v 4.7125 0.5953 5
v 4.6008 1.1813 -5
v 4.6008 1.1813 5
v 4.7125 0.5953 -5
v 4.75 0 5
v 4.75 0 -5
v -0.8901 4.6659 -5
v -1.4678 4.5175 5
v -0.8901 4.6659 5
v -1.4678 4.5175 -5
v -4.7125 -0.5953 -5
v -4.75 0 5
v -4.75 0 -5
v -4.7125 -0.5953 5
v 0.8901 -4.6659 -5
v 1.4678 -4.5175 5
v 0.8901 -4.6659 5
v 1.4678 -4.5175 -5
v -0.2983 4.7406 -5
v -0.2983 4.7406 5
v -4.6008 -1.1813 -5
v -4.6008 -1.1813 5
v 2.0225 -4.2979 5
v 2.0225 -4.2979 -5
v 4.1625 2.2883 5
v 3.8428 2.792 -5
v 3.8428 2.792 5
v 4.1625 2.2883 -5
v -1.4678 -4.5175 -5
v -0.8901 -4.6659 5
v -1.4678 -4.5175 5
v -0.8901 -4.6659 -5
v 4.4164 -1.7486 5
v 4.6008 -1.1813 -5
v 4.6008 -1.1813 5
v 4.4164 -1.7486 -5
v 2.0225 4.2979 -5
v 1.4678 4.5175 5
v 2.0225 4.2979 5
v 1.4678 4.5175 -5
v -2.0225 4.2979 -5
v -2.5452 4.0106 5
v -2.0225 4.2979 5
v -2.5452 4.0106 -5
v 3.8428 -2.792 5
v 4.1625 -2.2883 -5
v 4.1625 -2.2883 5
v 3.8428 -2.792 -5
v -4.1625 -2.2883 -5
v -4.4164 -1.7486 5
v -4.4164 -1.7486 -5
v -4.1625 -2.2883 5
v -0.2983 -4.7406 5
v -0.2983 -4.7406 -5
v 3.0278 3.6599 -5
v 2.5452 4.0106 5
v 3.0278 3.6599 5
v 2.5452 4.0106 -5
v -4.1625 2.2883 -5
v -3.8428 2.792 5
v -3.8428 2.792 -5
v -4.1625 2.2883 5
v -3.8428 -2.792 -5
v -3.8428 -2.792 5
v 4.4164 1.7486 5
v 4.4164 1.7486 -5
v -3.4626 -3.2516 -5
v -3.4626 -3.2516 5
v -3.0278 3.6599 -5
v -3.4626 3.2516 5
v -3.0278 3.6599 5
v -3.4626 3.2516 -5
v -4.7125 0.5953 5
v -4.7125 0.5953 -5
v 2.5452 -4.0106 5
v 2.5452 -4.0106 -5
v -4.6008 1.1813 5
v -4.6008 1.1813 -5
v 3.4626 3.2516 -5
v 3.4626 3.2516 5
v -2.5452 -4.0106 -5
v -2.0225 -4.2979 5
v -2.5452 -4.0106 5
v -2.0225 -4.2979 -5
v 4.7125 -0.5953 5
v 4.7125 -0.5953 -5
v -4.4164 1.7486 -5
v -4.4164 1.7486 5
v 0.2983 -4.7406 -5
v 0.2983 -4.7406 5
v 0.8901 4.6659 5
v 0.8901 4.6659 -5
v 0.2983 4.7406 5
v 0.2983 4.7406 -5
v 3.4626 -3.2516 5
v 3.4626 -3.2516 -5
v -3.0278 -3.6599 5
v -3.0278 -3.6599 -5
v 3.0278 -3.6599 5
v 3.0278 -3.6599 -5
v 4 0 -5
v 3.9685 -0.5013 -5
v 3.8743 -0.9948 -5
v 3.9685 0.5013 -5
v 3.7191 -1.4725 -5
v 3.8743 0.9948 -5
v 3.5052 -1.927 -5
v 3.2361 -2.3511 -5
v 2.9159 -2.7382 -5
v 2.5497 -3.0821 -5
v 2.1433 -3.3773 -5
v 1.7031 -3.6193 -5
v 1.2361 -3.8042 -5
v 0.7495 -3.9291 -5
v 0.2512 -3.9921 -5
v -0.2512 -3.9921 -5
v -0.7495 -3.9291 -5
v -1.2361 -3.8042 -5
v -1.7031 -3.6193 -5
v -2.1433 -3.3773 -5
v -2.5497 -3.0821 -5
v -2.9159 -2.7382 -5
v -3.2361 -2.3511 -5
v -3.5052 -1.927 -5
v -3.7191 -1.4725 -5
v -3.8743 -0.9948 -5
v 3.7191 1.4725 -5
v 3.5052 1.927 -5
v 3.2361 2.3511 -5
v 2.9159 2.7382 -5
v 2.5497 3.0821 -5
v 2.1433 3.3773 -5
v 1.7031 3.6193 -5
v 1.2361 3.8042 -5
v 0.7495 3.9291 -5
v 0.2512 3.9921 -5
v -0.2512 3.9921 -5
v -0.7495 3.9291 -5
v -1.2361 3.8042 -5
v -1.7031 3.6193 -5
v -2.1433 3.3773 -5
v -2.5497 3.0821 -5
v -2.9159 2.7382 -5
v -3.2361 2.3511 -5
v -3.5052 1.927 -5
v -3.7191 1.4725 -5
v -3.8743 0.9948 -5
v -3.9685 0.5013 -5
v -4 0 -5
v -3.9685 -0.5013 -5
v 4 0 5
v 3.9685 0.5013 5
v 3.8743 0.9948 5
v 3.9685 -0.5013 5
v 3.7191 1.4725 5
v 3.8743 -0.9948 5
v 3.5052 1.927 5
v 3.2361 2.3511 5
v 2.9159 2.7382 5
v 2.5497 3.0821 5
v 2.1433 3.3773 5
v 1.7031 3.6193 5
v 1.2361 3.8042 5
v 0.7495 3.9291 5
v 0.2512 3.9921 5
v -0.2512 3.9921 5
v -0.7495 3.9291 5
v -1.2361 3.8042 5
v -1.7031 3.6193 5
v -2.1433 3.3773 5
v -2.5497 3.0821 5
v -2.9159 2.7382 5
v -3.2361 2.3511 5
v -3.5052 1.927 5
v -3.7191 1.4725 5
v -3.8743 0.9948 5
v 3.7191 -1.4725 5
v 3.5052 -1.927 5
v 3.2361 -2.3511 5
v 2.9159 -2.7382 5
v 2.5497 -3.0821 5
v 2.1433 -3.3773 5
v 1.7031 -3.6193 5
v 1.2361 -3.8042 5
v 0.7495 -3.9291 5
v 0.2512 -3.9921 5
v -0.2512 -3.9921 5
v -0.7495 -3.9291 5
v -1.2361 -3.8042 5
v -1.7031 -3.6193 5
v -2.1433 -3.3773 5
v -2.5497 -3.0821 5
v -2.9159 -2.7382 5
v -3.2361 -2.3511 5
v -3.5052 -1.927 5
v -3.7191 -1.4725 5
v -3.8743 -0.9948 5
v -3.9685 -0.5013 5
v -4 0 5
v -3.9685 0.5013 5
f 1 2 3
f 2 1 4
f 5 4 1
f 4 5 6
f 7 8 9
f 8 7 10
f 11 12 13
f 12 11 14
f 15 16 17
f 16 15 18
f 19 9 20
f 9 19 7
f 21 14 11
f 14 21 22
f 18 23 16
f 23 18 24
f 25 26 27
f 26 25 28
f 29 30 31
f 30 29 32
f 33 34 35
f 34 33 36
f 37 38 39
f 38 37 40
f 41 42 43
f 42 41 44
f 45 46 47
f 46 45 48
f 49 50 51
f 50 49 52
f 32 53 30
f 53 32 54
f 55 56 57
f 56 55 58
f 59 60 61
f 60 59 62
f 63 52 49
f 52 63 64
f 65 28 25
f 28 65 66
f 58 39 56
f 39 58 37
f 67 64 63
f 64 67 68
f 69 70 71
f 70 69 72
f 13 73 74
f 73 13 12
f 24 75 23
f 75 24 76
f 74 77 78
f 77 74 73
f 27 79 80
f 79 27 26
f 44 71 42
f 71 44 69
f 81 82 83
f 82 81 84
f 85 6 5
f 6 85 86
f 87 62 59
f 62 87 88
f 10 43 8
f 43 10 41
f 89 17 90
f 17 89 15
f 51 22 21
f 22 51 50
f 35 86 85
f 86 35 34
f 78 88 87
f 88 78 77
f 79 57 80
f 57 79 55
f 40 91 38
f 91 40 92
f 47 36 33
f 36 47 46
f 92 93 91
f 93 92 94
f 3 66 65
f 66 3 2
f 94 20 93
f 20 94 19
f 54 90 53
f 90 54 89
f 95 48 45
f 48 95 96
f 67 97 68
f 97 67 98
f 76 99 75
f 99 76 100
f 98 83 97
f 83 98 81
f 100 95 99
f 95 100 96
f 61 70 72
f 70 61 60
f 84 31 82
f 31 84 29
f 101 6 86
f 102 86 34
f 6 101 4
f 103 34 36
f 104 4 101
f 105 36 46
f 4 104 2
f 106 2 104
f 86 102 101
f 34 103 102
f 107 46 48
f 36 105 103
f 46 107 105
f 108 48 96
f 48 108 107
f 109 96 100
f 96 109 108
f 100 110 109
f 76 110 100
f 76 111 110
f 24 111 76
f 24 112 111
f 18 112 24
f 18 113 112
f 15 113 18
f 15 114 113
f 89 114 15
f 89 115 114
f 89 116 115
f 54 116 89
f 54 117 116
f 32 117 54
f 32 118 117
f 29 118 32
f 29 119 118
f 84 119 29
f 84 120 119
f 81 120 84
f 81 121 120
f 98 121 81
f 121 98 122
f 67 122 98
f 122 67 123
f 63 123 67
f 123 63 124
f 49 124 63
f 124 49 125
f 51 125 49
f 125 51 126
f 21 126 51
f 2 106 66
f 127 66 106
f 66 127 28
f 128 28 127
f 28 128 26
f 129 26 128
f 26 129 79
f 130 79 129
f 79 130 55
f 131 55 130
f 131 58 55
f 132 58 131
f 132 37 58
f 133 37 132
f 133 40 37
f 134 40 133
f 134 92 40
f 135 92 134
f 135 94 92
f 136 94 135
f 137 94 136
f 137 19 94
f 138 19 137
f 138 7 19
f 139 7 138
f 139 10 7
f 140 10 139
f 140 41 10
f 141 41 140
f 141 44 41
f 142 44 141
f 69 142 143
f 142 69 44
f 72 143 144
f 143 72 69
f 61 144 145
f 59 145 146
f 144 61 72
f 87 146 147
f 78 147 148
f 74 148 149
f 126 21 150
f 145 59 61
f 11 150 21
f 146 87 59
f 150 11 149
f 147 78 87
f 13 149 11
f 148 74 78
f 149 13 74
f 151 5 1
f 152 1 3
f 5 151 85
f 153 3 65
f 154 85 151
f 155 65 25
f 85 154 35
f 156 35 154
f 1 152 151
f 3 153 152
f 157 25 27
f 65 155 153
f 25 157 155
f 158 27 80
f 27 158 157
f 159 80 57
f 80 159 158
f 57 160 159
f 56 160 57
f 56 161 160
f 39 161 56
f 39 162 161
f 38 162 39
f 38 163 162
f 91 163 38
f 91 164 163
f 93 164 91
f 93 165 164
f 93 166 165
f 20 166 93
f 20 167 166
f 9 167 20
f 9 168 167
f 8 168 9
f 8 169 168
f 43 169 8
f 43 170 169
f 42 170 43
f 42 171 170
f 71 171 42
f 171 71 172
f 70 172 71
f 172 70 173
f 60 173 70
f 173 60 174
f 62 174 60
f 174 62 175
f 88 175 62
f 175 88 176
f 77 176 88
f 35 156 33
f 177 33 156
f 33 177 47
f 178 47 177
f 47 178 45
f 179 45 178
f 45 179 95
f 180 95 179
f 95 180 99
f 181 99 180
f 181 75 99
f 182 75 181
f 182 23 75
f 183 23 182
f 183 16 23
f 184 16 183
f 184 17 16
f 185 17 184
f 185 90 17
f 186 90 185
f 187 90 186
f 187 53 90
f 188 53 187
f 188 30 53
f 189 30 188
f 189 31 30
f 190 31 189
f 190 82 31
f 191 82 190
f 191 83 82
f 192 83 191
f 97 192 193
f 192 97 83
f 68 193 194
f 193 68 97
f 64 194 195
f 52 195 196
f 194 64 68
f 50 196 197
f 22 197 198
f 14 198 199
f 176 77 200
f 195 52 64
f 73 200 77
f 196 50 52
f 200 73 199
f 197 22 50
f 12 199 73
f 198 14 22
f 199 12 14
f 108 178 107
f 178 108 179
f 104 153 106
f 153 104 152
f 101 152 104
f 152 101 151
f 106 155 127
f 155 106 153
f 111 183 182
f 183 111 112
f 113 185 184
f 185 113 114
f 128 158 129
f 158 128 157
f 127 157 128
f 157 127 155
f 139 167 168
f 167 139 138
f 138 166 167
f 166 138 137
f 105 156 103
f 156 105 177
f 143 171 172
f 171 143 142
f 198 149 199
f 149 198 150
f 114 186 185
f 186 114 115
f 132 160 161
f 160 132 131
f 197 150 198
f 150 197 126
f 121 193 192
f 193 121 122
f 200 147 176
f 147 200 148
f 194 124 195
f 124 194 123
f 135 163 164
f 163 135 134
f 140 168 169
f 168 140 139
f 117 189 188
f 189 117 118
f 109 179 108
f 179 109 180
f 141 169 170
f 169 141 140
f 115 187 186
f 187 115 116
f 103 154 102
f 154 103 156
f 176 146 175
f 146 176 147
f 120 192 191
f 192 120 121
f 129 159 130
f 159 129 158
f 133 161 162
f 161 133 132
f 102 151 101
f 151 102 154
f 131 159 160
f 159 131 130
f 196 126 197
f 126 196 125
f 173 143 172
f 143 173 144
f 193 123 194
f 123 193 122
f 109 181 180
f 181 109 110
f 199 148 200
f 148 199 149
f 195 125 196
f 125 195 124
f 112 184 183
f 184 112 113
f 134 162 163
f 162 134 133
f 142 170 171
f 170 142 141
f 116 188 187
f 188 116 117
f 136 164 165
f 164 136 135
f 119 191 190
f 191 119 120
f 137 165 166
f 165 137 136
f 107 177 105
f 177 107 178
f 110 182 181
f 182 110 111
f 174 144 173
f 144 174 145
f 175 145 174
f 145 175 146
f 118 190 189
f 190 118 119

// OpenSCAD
$fn = 50;


difference() {
	union() {
		translate(v = [0, 0, -5.0000000000]) {
			cylinder(h = 10, r = 4.7500000000);
		}
	}
	union() {
		translate(v = [0, 0, -100.0000000000]) {
			cylinder(h = 200, r = 4.0000000000);
		}
	}
}
